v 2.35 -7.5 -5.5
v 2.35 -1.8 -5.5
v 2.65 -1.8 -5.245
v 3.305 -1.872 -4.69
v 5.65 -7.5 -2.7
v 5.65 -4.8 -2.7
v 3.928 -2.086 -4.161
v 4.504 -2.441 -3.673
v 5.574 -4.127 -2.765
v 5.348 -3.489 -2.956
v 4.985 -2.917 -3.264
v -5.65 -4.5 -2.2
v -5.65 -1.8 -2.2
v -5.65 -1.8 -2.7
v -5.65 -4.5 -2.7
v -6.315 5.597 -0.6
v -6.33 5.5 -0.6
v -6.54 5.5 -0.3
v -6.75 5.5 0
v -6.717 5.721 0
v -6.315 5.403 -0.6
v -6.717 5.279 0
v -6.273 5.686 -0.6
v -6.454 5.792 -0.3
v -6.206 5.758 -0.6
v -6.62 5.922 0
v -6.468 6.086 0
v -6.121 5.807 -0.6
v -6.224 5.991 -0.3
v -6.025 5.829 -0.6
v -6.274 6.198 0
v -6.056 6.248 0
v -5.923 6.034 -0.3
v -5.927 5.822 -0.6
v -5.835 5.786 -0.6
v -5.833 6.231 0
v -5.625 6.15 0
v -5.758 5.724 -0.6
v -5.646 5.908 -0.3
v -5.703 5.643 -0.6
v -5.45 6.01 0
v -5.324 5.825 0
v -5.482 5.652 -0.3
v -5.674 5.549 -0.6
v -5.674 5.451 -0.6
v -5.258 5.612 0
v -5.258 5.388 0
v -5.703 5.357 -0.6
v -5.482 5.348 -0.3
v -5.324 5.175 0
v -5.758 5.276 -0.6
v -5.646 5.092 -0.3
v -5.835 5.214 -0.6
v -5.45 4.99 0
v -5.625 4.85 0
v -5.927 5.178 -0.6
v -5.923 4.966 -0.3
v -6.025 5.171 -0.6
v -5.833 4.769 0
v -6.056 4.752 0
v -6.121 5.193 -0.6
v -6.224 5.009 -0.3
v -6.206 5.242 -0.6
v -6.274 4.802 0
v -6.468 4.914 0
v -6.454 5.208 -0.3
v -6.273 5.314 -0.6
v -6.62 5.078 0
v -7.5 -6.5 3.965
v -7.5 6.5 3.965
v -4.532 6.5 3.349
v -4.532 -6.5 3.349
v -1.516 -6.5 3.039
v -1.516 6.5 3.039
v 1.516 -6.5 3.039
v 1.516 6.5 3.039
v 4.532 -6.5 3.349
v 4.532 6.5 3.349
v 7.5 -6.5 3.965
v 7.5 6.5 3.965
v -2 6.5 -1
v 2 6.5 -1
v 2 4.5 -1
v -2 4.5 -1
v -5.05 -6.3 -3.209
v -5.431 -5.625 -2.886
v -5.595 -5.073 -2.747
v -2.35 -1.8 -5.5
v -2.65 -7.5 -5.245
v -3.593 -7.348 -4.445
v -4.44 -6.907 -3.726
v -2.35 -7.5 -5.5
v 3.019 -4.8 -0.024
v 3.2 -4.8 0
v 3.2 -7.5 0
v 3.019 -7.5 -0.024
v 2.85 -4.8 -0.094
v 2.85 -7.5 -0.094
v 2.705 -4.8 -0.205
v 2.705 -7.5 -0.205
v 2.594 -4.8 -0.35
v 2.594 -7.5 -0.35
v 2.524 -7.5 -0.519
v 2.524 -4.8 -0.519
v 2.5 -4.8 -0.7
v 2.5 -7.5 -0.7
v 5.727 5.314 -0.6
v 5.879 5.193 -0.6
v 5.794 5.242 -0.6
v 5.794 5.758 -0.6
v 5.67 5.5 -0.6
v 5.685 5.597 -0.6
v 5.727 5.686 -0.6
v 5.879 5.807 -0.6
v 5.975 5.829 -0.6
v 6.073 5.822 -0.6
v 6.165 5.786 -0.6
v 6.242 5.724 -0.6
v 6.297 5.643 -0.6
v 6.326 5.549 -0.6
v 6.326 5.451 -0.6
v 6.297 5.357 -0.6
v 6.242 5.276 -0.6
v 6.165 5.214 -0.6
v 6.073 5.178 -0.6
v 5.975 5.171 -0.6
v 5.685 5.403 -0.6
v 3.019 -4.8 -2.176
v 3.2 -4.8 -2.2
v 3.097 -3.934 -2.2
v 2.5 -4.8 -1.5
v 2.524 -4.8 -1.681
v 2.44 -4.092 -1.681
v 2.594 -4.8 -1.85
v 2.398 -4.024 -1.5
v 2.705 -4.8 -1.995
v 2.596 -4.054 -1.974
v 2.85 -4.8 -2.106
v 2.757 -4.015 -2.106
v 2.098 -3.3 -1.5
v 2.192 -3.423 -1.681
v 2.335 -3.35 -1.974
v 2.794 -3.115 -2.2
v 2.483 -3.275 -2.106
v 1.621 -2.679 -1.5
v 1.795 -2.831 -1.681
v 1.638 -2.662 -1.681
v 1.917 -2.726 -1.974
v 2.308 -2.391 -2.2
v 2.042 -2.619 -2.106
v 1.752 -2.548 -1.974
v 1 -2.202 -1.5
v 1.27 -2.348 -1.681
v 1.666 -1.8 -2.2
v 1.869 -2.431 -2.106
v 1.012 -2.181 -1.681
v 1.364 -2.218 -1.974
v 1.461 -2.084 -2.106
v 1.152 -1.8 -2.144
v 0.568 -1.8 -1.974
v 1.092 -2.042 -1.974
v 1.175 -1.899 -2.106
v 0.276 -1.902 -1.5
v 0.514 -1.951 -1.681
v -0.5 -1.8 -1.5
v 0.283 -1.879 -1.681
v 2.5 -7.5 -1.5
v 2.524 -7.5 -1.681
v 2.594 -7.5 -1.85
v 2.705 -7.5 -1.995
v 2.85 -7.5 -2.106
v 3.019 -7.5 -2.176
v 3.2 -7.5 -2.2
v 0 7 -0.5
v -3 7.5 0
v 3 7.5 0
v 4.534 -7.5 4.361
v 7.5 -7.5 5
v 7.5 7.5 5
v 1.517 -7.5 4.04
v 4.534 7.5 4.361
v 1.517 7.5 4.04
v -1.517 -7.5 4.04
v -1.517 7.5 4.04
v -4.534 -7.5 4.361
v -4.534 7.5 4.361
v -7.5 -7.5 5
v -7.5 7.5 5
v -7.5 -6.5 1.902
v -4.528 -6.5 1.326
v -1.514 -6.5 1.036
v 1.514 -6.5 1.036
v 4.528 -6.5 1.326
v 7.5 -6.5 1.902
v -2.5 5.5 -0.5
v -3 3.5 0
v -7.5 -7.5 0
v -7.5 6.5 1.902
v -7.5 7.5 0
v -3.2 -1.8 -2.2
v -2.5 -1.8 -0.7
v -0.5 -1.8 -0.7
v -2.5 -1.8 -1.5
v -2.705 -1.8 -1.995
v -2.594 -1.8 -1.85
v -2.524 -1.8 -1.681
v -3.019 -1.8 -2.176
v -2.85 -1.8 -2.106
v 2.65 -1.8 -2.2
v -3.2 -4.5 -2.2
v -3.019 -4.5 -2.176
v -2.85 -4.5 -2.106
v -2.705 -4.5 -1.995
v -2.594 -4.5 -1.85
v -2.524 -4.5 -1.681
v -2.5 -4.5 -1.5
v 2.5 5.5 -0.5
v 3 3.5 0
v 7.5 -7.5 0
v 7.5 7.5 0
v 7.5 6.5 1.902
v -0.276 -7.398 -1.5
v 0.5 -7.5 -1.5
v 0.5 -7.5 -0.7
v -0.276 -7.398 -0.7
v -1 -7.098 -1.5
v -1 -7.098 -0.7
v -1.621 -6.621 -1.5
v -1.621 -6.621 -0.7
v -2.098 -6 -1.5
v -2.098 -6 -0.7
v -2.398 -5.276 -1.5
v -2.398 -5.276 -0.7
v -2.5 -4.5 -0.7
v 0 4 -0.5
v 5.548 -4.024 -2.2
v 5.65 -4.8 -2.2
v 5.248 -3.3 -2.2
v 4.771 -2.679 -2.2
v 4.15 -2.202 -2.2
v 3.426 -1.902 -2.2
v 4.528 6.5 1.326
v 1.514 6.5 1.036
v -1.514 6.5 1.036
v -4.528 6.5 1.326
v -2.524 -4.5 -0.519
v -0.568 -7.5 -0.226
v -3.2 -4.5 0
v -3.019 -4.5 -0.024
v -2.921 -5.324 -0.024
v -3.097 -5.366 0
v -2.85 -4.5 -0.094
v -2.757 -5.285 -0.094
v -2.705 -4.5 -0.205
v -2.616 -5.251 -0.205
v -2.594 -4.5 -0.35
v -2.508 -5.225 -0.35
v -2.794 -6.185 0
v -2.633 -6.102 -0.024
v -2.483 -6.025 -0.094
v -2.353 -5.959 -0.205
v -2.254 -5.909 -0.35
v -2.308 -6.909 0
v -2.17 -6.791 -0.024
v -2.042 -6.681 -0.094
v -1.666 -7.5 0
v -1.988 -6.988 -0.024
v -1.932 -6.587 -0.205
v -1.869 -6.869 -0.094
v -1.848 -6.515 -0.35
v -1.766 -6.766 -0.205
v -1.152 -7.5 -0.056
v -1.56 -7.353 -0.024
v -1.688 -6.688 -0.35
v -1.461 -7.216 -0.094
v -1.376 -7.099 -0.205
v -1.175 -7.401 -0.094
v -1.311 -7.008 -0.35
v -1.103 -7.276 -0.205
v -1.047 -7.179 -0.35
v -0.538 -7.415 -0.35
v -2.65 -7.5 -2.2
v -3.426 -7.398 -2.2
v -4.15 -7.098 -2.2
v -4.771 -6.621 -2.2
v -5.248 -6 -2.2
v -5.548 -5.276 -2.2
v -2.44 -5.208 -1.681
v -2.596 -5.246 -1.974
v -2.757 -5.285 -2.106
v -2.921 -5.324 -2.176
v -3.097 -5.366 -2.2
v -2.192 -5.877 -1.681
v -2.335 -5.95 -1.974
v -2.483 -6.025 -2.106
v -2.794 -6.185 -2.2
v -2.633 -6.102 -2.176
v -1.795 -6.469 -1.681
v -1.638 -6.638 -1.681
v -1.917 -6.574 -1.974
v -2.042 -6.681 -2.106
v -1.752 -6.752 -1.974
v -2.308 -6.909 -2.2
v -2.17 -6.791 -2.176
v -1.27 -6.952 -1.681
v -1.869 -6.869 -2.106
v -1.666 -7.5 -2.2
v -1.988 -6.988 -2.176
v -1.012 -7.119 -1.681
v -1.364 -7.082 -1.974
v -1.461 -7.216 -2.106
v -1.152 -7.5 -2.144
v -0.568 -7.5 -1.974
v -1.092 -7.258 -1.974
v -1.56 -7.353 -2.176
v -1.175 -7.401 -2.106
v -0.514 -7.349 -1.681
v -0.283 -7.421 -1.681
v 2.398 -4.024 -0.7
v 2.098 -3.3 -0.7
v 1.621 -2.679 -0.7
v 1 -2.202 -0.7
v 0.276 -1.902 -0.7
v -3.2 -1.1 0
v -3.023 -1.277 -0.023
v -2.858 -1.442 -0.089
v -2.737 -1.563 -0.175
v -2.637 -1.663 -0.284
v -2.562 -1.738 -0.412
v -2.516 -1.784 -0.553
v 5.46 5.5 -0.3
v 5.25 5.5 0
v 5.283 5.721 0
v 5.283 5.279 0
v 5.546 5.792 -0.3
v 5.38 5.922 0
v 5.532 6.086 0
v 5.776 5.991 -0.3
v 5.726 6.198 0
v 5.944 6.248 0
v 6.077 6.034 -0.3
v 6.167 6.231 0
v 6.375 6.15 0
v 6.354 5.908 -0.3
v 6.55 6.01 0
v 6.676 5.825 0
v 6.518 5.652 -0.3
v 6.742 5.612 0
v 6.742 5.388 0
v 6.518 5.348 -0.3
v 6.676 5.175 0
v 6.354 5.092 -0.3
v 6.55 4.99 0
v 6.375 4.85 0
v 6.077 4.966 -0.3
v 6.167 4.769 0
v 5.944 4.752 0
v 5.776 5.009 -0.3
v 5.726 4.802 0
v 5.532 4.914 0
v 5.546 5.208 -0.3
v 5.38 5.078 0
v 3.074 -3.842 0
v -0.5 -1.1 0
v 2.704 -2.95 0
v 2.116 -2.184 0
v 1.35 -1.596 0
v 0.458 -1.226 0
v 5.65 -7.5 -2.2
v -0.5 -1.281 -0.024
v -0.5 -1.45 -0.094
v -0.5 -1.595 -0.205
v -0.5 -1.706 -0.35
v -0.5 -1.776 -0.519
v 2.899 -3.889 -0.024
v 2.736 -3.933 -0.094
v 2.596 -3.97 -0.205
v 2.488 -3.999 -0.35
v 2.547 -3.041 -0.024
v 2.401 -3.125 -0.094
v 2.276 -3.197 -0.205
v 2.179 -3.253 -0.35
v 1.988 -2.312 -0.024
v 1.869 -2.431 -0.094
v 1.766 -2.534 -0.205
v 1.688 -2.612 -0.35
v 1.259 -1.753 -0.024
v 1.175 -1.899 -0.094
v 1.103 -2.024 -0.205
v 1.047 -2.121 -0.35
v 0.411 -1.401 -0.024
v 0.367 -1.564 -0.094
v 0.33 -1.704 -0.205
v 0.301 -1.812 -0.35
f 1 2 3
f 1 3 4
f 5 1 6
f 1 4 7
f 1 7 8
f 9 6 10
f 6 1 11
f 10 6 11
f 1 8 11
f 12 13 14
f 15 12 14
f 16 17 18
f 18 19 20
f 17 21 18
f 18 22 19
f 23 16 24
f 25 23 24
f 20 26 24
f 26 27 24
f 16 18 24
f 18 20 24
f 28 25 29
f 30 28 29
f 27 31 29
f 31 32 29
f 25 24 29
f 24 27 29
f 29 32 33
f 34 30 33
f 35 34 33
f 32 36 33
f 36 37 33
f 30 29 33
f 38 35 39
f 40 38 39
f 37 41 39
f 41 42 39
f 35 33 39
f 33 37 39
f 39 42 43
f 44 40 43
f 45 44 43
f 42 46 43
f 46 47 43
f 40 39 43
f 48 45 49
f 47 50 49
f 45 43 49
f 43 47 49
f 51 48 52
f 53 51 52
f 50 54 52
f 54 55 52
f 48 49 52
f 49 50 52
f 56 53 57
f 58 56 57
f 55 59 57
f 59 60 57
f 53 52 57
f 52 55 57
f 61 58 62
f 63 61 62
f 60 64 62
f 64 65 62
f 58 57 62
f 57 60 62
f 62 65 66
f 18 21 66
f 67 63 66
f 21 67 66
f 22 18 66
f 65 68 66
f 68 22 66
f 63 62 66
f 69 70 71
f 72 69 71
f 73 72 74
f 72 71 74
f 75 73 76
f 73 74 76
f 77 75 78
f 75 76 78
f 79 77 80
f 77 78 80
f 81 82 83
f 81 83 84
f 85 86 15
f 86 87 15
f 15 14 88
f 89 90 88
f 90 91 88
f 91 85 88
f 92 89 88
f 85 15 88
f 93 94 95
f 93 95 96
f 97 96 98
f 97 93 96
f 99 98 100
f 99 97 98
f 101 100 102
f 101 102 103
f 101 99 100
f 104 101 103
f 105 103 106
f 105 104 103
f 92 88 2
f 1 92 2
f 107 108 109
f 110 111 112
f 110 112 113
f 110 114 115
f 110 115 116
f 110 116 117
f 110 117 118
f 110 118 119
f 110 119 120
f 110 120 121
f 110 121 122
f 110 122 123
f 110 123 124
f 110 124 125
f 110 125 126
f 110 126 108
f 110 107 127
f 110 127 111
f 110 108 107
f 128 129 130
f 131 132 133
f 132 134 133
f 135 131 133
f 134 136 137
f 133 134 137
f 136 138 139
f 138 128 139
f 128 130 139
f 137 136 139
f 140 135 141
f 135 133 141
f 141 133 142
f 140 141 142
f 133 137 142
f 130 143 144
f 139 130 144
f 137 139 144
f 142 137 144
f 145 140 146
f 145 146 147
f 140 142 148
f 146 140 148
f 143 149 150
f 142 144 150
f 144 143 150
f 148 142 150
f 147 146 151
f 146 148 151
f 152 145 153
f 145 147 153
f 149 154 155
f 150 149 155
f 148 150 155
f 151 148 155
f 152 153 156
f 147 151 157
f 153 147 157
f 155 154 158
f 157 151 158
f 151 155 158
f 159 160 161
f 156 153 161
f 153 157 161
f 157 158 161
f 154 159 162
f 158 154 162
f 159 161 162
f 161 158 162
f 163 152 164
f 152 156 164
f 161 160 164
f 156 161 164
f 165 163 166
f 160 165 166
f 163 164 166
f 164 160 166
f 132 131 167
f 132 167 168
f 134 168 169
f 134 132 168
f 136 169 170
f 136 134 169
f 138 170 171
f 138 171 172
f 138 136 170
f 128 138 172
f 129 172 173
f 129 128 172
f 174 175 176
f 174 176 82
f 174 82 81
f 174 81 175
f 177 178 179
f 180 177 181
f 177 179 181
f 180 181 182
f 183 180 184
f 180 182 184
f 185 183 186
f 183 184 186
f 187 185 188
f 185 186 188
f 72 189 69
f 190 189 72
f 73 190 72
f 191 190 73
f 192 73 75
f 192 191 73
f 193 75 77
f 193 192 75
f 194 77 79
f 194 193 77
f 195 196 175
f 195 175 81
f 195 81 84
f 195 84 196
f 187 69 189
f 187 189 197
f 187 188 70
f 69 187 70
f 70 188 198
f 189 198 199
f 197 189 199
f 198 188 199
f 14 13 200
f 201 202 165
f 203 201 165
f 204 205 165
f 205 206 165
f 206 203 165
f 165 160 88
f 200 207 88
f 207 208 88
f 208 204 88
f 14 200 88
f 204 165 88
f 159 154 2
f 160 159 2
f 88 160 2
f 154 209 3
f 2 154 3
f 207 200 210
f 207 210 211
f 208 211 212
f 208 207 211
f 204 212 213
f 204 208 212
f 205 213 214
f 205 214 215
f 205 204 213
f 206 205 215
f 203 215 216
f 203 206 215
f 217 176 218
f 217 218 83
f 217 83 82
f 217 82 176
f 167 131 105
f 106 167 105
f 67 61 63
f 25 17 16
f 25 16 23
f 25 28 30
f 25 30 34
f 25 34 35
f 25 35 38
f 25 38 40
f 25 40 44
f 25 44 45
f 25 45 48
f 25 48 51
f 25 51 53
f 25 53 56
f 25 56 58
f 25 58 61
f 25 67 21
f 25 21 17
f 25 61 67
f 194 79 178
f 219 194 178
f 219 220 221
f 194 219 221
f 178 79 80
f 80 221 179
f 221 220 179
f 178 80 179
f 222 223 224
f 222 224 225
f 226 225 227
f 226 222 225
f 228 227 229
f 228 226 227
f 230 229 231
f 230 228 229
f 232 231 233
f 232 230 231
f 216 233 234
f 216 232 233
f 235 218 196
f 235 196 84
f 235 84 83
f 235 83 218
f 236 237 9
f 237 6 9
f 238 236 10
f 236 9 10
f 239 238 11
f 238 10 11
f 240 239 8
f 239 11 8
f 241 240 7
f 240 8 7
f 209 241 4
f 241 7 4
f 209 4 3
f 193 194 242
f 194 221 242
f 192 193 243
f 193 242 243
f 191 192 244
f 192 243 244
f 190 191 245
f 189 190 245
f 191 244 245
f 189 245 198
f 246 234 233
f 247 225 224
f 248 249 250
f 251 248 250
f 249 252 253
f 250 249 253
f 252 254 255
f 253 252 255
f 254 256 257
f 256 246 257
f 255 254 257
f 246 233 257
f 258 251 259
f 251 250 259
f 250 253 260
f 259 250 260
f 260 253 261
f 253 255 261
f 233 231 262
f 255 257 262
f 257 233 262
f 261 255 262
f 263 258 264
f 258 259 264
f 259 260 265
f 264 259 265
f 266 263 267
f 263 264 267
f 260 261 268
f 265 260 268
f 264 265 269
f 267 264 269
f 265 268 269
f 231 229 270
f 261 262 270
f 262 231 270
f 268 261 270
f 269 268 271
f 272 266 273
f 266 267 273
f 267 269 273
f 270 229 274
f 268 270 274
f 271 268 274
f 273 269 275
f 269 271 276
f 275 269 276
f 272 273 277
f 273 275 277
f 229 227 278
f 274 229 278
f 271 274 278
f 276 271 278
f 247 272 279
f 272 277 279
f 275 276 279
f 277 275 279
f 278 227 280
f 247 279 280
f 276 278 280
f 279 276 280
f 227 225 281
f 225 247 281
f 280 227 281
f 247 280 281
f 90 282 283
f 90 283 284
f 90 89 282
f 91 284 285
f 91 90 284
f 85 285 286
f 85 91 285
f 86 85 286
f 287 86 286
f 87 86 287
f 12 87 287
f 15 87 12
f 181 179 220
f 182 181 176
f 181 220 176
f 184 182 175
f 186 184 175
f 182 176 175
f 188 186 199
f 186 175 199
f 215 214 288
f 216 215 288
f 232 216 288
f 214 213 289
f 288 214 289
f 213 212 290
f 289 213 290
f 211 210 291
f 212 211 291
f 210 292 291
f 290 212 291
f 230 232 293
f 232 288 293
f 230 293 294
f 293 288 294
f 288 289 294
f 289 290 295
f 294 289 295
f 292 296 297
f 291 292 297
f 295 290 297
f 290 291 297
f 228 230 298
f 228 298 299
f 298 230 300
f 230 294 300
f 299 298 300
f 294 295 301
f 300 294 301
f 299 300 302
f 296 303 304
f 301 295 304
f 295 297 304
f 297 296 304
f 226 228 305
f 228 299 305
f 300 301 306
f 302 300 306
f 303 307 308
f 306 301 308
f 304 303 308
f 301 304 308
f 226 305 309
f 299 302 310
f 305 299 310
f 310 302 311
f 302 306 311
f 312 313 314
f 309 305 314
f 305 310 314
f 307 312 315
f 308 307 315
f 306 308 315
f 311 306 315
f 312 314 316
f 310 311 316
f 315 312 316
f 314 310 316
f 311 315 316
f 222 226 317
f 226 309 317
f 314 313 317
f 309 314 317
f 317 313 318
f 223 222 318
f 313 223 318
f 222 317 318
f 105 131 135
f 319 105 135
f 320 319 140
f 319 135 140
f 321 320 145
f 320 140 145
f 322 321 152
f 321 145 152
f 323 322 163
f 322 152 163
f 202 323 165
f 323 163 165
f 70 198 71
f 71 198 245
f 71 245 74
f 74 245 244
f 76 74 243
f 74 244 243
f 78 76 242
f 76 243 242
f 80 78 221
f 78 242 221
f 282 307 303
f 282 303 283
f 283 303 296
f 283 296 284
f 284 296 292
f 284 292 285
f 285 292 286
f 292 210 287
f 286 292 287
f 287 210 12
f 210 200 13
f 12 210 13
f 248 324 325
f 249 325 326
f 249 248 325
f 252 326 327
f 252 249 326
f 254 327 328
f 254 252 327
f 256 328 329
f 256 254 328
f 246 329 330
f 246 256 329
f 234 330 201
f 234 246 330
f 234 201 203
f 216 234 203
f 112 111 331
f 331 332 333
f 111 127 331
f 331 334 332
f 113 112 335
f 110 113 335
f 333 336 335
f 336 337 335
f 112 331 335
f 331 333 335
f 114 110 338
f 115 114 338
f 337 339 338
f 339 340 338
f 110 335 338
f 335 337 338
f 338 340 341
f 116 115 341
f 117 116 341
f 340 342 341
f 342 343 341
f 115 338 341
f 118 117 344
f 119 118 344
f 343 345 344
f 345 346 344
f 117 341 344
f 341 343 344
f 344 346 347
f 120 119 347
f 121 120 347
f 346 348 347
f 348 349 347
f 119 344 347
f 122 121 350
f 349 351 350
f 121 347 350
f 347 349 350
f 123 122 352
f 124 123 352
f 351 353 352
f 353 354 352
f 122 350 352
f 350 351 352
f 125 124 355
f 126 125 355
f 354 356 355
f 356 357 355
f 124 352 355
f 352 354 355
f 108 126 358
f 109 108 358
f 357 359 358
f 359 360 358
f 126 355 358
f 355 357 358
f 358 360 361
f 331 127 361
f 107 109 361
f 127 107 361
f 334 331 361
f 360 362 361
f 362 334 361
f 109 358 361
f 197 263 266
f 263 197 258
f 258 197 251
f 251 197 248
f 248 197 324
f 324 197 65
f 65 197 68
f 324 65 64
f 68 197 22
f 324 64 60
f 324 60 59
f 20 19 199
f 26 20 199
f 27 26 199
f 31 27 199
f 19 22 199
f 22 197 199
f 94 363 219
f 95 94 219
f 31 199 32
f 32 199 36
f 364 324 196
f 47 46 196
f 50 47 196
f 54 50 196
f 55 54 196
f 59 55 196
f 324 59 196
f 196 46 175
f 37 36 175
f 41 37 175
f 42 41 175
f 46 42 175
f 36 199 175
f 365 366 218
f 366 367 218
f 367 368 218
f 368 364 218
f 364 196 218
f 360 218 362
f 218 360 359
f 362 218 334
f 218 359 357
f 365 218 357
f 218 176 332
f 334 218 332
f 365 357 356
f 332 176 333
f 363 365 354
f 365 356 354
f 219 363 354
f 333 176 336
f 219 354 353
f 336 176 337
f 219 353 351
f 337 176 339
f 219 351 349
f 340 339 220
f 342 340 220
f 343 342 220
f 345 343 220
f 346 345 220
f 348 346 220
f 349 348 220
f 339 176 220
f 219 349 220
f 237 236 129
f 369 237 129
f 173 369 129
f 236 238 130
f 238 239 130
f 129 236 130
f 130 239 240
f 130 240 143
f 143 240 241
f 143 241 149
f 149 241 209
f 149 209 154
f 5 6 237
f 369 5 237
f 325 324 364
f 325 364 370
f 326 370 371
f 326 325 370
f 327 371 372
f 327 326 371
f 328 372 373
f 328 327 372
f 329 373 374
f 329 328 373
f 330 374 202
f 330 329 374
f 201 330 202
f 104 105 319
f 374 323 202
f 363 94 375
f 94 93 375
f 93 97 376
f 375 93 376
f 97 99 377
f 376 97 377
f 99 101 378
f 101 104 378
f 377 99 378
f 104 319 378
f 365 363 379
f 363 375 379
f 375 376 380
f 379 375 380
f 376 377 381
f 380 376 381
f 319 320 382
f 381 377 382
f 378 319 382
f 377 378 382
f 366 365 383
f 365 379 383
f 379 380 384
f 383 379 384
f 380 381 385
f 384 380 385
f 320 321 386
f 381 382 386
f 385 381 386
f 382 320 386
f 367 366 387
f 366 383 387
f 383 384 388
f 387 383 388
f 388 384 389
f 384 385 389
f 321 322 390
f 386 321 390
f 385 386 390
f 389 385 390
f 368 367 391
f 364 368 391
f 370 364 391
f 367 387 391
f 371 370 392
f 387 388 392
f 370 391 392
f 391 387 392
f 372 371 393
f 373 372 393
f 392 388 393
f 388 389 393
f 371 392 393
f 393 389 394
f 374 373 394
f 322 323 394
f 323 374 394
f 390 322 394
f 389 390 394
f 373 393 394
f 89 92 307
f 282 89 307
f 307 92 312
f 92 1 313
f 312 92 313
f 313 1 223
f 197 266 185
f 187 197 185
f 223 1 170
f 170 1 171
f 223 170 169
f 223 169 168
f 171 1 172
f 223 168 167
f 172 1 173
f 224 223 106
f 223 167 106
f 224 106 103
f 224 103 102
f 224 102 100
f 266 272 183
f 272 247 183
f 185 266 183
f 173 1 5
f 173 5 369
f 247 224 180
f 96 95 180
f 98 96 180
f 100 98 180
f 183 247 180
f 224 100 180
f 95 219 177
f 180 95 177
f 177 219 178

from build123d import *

# Parameters (mm, degrees)
BOSS_EXTRUDE1_DEPTH           = 7.5
CUT_EXTRUDE2_DEPTH            = 9.3
FILLET1_R                     = 3
FILLET2_R                     = 0.7
SKETCH3_W                     = 6
SKETCH3_H                     = 4
BOSS_EXTRUDE2_DEPTH           = 1
BOSS_EXTRUDE2_TAPER           = 45
SKETCH5_R                     = 0.75
BOSS_EXTRUDE3_DEPTH           = 0.6
BOSS_EXTRUDE3_DRAFT           = 35
BOSS_EXTRUDE3_PROFILE_2_DEPTH = 0.6
BOSS_EXTRUDE3_PROFILE_2_DRAFT = 35
CUT_EXTRUDE3_DEPTH            = 6.5


with BuildPart() as part:
    # Sketch1 → Boss-Extrude1 (new, symmetric)
    with BuildSketch(Plane(origin=(0, 0, 0), x_dir=(1, 0, 0), z_dir=(0, 1, 0))):
        with BuildLine():
            Line((-2.35, 5.5), (2.35, 5.5))
            Line((2.35, 5.5), (5.65, 2.7))
            Line((5.65, 2.7), (5.65, 2.2))
            Line((5.65, 2.2), (2.5, 2.2))
            Line((2.5, 2.2), (2.5, 0))
            Line((2.5, 0), (7.5, 0))
            Line((7.5, 0), (7.5, -5))
            ThreePointArc((7.5, -5), (0, -4), (-7.5, -5))
            Line((-7.5, -5), (-7.5, 0))
            Line((-7.5, 0), (-2.5, 0))
            Line((-2.5, 0), (-2.5, 2.2))
            Line((-2.5, 2.2), (-5.65, 2.2))
            Line((-5.65, 2.2), (-5.65, 2.7))
            Line((-5.65, 2.7), (-2.35, 5.5))
        make_face()
    extrude(amount=BOSS_EXTRUDE1_DEPTH, both=True)

    # Sketch2 → Cut-Extrude2 (cut)
    with BuildSketch(Plane(origin=(0, 7.5, 0), x_dir=(1, 0, 0), z_dir=(0, 1, 0))):
        Polygon((-2.5, 0), (2.5, 0), (2.5, 2.2), (5.65, 2.2), (5.65, 2.7), (2.35, 5.5), (-2.35, 5.5), (-5.65, 2.7), (-5.65, 2.2), (-2.5, 2.2), align=None)
    extrude(amount=-CUT_EXTRUDE2_DEPTH, mode=Mode.SUBTRACT)

    # Fillet1
    fillet1_edges = [part.edges().sort_by_distance(p)[0] for p in [
        (-2.5, -7.5, -1.1),
        (-5.65, -7.5, -2.45),
        (5.65, -1.8, -2.45),
        (2.5, -1.8, -1.1),
    ]]
    fillet(fillet1_edges, radius=FILLET1_R)

    # Fillet2
    # the kernel refuses this fillet: 0.7 mm, written as the material it adds along each edge
    with BuildSketch(Plane(origin=(-2.5, -4.5, 0), x_dir=(0, 0, -1), z_dir=(0, 1, 0)), Plane(origin=(-2.5, -1.8, -2.2), x_dir=(0, 0, 1), z_dir=(0, -1, 0)), Plane(origin=(2.5, -4.8, -2.2), x_dir=(1, 0, 0), z_dir=(0, -1, 0)), Plane(origin=(2.5, -4.8, 0), x_dir=(0, 0, -1), z_dir=(0, -1, 0))) as fillet2_piece_1:
        with BuildLine():
            CenterArc((FILLET2_R, FILLET2_R), FILLET2_R, 180, 90)
            Line((0, FILLET2_R), (0, 0))
            Line((0, 0), (FILLET2_R, 0))
        make_face()
    extrude(amount=2.7)
    with BuildSketch(Plane(origin=(-2.5, -1.8, 0), x_dir=(0, 0, -1), z_dir=(1, 0, 0))) as fillet2_piece_2:
        with BuildLine():
            CenterArc((FILLET2_R, FILLET2_R), FILLET2_R, 180, 90)
            Line((0, FILLET2_R), (0, 0))
            Line((0, 0), (FILLET2_R, 0))
        make_face()
    extrude(amount=2)
    with BuildSketch(Plane(origin=(0.5, -4.5, 0), x_dir=(-1, 0, 0), z_dir=(0, 1, 0))) as fillet2_piece_3_section:
        with BuildLine():
            CenterArc((3 + FILLET2_R, -FILLET2_R), FILLET2_R, 90, 90)
            Line((3 + FILLET2_R, 0), (3, 0))
            Line((3, 0), (3, -FILLET2_R))
        make_face()
    fillet2_piece_3 = revolve(axis=Axis((0.5, -4.5, 0), (0, 0, 1)), revolution_arc=146.841139064, mode=Mode.PRIVATE)
    fillet2_piece_3 = split(fillet2_piece_3, bisect_by=Plane(origin=(2.5, -4.5, 0), z_dir=(-1, 0, 0)), keep=Keep.TOP, mode=Mode.PRIVATE)
    fillet2_piece_3 = split(fillet2_piece_3, bisect_by=Plane(origin=(0.5, -7.5, 0), z_dir=(0, 1, 0)), keep=Keep.TOP, mode=Mode.PRIVATE)
    add(fillet2_piece_3)
    with BuildSketch(Plane(origin=(0.5, -4.5, -2.2), x_dir=(-1, 0, 0), z_dir=(0, 1, 0))) as fillet2_piece_4_section:
        with BuildLine():
            CenterArc((3 + FILLET2_R, FILLET2_R), FILLET2_R, 180, 90)
            Line((3, FILLET2_R), (3, 0))
            Line((3, 0), (3 + FILLET2_R, 0))
        make_face()
    fillet2_piece_4 = revolve(axis=Axis((0.5, -4.5, -2.2), (0, 0, 1)), revolution_arc=146.841139064, mode=Mode.PRIVATE)
    fillet2_piece_4 = split(fillet2_piece_4, bisect_by=Plane(origin=(2.5, -4.5, -2.2), z_dir=(-1, 0, 0)), keep=Keep.TOP, mode=Mode.PRIVATE)
    fillet2_piece_4 = split(fillet2_piece_4, bisect_by=Plane(origin=(0.5, -7.5, -2.2), z_dir=(0, 1, 0)), keep=Keep.TOP, mode=Mode.PRIVATE)
    add(fillet2_piece_4)
    with BuildSketch(Plane(origin=(-0.5, -4.8, 0), x_dir=(1, 0, 0), z_dir=(0, -1, 0))) as fillet2_piece_5:
        with BuildLine():
            CenterArc((3 + FILLET2_R, -FILLET2_R), FILLET2_R, 90, 90)
            Line((3 + FILLET2_R, 0), (3, 0))
            Line((3, 0), (3, -FILLET2_R))
        make_face()
    revolve(axis=Axis((-0.5, -4.8, 0), (0, 0, 1)), revolution_arc=90)
    with BuildSketch(Plane(origin=(-0.5, -4.8, -2.2), x_dir=(1, 0, 0), z_dir=(0, -1, 0))) as fillet2_piece_6_section:
        with BuildLine():
            CenterArc((3 + FILLET2_R, FILLET2_R), FILLET2_R, 180, 90)
            Line((3, FILLET2_R), (3, 0))
            Line((3, 0), (3 + FILLET2_R, 0))
        make_face()
    fillet2_piece_6 = revolve(axis=Axis((-0.5, -4.8, -2.2), (0, 0, 1)), revolution_arc=146.841139064, mode=Mode.PRIVATE)
    fillet2_piece_6 = split(fillet2_piece_6, bisect_by=Plane(origin=(-2.5, -4.8, -2.2), z_dir=(1, 0, 0)), keep=Keep.TOP, mode=Mode.PRIVATE)
    fillet2_piece_6 = split(fillet2_piece_6, bisect_by=Plane(origin=(-0.5, -1.8, -2.2), z_dir=(0, -1, 0)), keep=Keep.TOP, mode=Mode.PRIVATE)
    add(fillet2_piece_6)
    with BuildSketch(Plane(origin=(-2.5, -4.5, 0), x_dir=(0, 0, -1), z_dir=(0, 1, 0))) as fillet2_piece_7a_section:
        with BuildLine():
            CenterArc((FILLET2_R, FILLET2_R), FILLET2_R, 180, 90)
            Line((0, FILLET2_R), (0, 0))
            Line((0, 0), (FILLET2_R, 0))
        make_face()
    fillet2_piece_7a = extrude(amount=4.45, mode=Mode.PRIVATE)
    fillet2_piece_7a = split(fillet2_piece_7a, bisect_by=Plane(origin=(-2.5, -1.8, 0), z_dir=(0, 1, 0)), keep=Keep.TOP, mode=Mode.PRIVATE)
    with BuildSketch(Plane(origin=(-4.25, -1.8, 0), x_dir=(0, 0, -1), z_dir=(1, 0, 0))) as fillet2_piece_7b_section:
        with BuildLine():
            CenterArc((FILLET2_R, FILLET2_R), FILLET2_R, 180, 90)
            Line((0, FILLET2_R), (0, 0))
            Line((0, 0), (FILLET2_R, 0))
        make_face()
    fillet2_piece_7b = extrude(amount=3.75, mode=Mode.PRIVATE)
    fillet2_piece_7b = split(fillet2_piece_7b, bisect_by=Plane(origin=(-2.5, -1.8, 0), z_dir=(-1, 0, 0)), keep=Keep.TOP, mode=Mode.PRIVATE)
    fillet2_piece_7 = fillet2_piece_7a & fillet2_piece_7b
    add(fillet2_piece_7)

    # Sketch3 → Boss-Extrude2 (add)
    with BuildSketch(Plane(origin=(0, 0, 0), x_dir=(-1, 0, 0), z_dir=(0, 0, -1))):
        with Locations((0, 5.5)):
            Rectangle(SKETCH3_W, SKETCH3_H)
    extrude(amount=BOSS_EXTRUDE2_DEPTH, taper=BOSS_EXTRUDE2_TAPER)


with BuildPart() as boss_extrude3_tool:
    # Sketch5 → Boss-Extrude3 (with draft: the straight prism first)
    with BuildSketch(Plane(origin=(0, 0, 0), x_dir=(-1, 0, 0), z_dir=(0, 0, -1))):
        with Locations((6, 5.5)):
            Circle(SKETCH5_R)
    extrude(amount=BOSS_EXTRUDE3_DEPTH)
    # Boss-Extrude3: the draft: its side faces are tilted about the plane it starts from
    boss_extrude3_sides = [boss_extrude3_tool.faces().sort_by_distance(p)[0] for p in [
        (-5.25, 5.5, -0.3),
    ]]
    draft(boss_extrude3_sides, Plane(origin=(0, 0, 0), x_dir=(-1, 0, 0), z_dir=(0, 0, -1)), BOSS_EXTRUDE3_DRAFT)


with BuildPart() as part_1:
    add(part.part)

    # Boss-Extrude3: add boss_extrude3_tool
    add(boss_extrude3_tool.part)


with BuildPart() as boss_extrude3_profile_2_tool:
    # Sketch5 → Boss-Extrude3 profile 2 (with draft: the straight prism first)
    with BuildSketch(Plane(origin=(0, 0, 0), x_dir=(-1, 0, 0), z_dir=(0, 0, -1))):
        with Locations((-6, 5.5)):
            Circle(SKETCH5_R)
    extrude(amount=BOSS_EXTRUDE3_PROFILE_2_DEPTH)
    # Boss-Extrude3 profile 2: the draft: its side faces are tilted about the plane it starts from
    boss_extrude3_profile_2_sides = [boss_extrude3_profile_2_tool.faces().sort_by_distance(p)[0] for p in [
        (6.75, 5.5, -0.3),
    ]]
    draft(boss_extrude3_profile_2_sides, Plane(origin=(0, 0, 0), x_dir=(-1, 0, 0), z_dir=(0, 0, -1)), BOSS_EXTRUDE3_PROFILE_2_DRAFT)


with BuildPart() as part_2:
    add(part_1.part)

    # Boss-Extrude3 profile 2: add boss_extrude3_profile_2_tool
    add(boss_extrude3_profile_2_tool.part)

    # Sketch6 → Cut-Extrude3 (cut, symmetric)
    with BuildSketch(Plane(origin=(0, 0, 0), x_dir=(1, 0, 0), z_dir=(0, 1, 0))):
        with BuildLine():
            Line((-7.5, -1.902196987), (-7.5, -3.965086794))
            ThreePointArc((-7.5, -3.965086794), (0, -3), (7.5, -3.965086794))
            Line((7.5, -3.965086794), (7.5, -1.902196987))
            ThreePointArc((7.5, -1.902196987), (0, -1), (-7.5, -1.902196987))
        make_face()
    extrude(amount=CUT_EXTRUDE3_DEPTH, both=True, mode=Mode.SUBTRACT)


solid = part_2.part
